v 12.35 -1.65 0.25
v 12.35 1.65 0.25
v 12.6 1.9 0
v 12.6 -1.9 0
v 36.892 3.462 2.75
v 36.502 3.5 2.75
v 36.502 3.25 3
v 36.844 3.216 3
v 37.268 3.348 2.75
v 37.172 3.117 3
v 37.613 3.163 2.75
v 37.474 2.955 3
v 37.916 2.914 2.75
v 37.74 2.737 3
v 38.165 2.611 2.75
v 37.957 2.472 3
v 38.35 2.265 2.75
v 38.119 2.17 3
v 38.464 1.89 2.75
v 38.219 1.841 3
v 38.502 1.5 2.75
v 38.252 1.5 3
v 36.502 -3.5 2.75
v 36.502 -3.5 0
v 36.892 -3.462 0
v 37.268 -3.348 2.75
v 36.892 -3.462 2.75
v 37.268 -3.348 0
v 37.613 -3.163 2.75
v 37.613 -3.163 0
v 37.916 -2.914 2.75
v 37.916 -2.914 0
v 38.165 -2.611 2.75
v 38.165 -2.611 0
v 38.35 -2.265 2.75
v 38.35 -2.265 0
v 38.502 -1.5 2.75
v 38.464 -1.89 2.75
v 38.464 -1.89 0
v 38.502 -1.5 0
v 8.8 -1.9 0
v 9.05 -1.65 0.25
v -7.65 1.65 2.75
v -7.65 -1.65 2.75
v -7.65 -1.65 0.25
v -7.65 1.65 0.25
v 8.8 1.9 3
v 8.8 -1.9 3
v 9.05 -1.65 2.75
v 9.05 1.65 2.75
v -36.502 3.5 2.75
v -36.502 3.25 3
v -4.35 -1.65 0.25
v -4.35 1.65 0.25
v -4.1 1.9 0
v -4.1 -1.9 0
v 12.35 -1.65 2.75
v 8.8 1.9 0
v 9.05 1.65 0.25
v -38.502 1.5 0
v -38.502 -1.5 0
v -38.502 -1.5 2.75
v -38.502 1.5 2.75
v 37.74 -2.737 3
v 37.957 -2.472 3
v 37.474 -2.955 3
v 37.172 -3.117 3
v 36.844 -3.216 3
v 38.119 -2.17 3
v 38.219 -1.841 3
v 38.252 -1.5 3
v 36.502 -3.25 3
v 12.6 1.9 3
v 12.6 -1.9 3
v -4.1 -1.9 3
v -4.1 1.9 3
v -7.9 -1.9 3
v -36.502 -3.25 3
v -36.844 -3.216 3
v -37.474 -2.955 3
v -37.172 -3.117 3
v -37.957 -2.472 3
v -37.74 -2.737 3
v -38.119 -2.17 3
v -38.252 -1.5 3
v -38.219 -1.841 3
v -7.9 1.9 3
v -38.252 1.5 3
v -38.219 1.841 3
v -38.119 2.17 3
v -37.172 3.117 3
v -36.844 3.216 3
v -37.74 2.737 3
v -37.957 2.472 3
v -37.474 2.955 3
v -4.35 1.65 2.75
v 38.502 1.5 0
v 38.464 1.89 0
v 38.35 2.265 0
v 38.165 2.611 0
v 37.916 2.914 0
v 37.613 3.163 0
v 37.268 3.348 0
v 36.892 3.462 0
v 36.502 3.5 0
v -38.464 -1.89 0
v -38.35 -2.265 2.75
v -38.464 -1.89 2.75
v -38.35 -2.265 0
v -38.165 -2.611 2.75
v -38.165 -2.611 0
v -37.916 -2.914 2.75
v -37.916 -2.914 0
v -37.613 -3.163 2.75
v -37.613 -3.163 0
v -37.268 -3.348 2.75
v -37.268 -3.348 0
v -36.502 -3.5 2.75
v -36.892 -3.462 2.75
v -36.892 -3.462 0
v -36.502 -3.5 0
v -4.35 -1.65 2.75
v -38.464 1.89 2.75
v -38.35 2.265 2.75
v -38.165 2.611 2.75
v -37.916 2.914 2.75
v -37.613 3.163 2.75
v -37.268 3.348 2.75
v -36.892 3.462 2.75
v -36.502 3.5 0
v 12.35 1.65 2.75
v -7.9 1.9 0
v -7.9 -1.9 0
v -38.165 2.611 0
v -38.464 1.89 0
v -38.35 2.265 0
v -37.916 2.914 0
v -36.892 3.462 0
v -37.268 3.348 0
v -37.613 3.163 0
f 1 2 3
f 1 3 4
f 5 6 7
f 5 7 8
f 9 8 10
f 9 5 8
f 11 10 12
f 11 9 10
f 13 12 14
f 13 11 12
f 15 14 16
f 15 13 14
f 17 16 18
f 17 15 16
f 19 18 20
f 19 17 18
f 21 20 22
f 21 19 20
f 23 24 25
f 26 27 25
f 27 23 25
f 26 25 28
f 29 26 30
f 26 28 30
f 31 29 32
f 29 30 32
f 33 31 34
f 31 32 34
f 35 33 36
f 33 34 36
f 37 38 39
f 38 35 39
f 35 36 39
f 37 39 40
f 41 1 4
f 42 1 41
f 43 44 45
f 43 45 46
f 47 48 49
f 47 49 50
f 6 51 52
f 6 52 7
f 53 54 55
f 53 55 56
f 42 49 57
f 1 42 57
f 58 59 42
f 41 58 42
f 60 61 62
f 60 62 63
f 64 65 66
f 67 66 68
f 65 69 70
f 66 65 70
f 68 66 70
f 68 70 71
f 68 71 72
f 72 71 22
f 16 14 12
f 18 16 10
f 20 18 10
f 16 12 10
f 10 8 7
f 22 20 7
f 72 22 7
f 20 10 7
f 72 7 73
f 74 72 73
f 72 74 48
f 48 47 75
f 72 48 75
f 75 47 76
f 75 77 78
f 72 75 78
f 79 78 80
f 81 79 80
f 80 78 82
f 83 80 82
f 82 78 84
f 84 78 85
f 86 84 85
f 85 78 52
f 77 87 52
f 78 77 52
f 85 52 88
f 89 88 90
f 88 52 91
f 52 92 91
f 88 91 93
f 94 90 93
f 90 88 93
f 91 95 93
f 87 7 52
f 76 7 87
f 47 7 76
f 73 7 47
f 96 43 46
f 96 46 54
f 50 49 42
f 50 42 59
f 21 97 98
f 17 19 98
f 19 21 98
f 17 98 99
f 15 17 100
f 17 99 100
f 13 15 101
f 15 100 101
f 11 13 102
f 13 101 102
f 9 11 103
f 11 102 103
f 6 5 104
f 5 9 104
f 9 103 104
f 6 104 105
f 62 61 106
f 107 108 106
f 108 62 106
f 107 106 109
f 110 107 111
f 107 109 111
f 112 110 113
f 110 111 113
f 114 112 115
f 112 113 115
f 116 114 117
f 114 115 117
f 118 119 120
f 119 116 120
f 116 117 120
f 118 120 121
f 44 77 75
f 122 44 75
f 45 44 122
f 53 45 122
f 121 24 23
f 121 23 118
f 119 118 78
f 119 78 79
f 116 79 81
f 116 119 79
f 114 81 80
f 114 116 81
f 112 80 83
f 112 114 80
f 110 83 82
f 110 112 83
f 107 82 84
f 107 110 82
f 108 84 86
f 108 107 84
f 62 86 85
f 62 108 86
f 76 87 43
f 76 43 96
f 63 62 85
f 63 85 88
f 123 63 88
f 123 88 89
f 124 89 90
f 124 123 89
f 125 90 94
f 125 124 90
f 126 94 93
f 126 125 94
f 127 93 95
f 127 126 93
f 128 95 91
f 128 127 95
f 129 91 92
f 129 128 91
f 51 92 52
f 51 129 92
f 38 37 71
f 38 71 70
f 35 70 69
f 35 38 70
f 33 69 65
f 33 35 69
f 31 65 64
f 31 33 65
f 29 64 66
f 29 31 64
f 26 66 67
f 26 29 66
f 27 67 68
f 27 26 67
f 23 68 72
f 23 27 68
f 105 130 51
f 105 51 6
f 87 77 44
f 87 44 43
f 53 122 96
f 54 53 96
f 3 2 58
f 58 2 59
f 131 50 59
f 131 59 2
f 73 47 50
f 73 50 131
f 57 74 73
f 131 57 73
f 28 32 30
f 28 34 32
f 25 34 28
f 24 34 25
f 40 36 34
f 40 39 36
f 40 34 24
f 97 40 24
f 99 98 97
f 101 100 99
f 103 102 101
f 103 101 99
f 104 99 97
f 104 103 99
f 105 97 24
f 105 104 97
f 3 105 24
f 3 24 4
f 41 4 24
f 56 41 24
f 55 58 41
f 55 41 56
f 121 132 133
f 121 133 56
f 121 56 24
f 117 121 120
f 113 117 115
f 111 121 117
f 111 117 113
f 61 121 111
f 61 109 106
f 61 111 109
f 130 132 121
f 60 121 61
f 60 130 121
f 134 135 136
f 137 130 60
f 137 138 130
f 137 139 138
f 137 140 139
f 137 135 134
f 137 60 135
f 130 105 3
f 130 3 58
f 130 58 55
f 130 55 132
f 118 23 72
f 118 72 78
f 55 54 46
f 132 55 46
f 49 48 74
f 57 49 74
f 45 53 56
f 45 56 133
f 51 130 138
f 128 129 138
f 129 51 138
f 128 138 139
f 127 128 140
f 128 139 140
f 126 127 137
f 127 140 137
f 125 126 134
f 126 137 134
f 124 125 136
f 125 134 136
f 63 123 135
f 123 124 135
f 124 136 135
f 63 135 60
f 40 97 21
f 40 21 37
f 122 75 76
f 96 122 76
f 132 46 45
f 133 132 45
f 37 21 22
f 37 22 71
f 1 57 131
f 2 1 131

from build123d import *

# Parameters (mm, degrees)
PAD005_DEPTH    = 3
SKETCH009_W     = 3.3
SKETCH009_H     = 3.3
POCKET003_DEPTH = 3.001
CHAMFER001_SIZE = 0.25
CHAMFER004_SIZE = 0.25
CHAMFER007_SIZE = 0.25


with BuildPart() as part:
    # Sketch008 → Pad005 (new body)
    with BuildSketch(Plane.XY):
        with BuildLine():
            Line((-36.502214, 3.5), (36.502214, 3.5))
            ThreePointArc((38.502214, 1.5), (37.916428, 2.914214), (36.502214, 3.5))
            Line((38.502214, 1.5), (38.502214, -1.5))
            ThreePointArc((36.502214, -3.5), (37.916428, -2.914214), (38.502214, -1.5))
            Line((36.502214, -3.5), (-36.502214, -3.5))
            ThreePointArc((-38.502214, -1.5), (-37.916428, -2.914214), (-36.502214, -3.5))
            Line((-38.502214, -1.5), (-38.502214, 1.5))
            ThreePointArc((-36.502214, 3.5), (-37.916428, 2.914214), (-38.502214, 1.5))
        make_face()
    extrude(amount=PAD005_DEPTH)

    # Sketch009 → Pocket003 (cut, through all)
    with BuildSketch(Plane.XY.offset(3)):
        with Locations((-6, 0)):
            Rectangle(SKETCH009_W, SKETCH009_H)
        with Locations((10.7, 0)):
            Rectangle(SKETCH009_W, SKETCH009_H)
    extrude(amount=-POCKET003_DEPTH, mode=Mode.SUBTRACT)

    # Chamfer001
    chamfer001_edges = [part.edges().sort_by_distance(p)[0] for p in [
        (0, -3.5, 3),
        (0, 3.5, 3),
    ]]
    chamfer(chamfer001_edges, length=CHAMFER001_SIZE)

    # Chamfer004
    chamfer004_edges = [part.edges().sort_by_distance(p)[0] for p in [
        (-7.65, 0, 0),
        (-6, 1.65, 0),
        (-4.35, 0, 0),
        (-6, -1.65, 0),
        (9.05, 0, 0),
        (10.7, -1.65, 0),
        (12.35, 0, 0),
        (10.7, 1.65, 0),
    ]]
    chamfer(chamfer004_edges, length=CHAMFER004_SIZE)

    # Chamfer007
    chamfer007_edges = [part.edges().sort_by_distance(p)[0] for p in [
        (9.05, 0, 3),
        (10.7, 1.65, 3),
        (12.35, 0, 3),
        (10.7, -1.65, 3),
        (-4.35, 0, 3),
        (-6, -1.65, 3),
        (-7.65, 0, 3),
        (-6, 1.65, 3),
    ]]
    chamfer(chamfer007_edges, length=CHAMFER007_SIZE)


solid = part.part
